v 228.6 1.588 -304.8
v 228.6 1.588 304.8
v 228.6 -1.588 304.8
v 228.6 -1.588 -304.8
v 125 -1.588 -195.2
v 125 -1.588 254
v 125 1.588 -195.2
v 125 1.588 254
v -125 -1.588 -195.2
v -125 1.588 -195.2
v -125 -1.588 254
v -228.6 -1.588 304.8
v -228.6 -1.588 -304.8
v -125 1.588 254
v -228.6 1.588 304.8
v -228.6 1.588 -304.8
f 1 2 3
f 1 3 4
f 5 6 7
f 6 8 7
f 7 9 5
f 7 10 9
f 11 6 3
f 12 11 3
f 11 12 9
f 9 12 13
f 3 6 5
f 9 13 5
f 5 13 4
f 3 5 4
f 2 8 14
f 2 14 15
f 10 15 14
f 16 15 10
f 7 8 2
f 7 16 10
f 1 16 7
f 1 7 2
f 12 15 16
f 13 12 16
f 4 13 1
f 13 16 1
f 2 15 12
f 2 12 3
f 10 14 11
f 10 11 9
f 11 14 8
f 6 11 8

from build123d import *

# Parameters (mm, degrees)
SKETCH1_W           = 457.2
SKETCH1_H           = 609.6
SKETCH1_W_2         = 250
SKETCH1_H_2         = 449.2
BOSS_EXTRUDE1_DEPTH = 1.5875


with BuildPart() as part:
    # Sketch1 → Boss-Extrude1 (new body, symmetric)
    with BuildSketch(Plane(origin=(0, 0, 0), x_dir=(1, 0, 0), z_dir=(0, 1, 0))):
        Rectangle(SKETCH1_W, SKETCH1_H)
        with Locations((0, -29.4)):
            Rectangle(SKETCH1_W_2, SKETCH1_H_2, mode=Mode.SUBTRACT)
    extrude(amount=BOSS_EXTRUDE1_DEPTH, both=True)


solid = part.part
